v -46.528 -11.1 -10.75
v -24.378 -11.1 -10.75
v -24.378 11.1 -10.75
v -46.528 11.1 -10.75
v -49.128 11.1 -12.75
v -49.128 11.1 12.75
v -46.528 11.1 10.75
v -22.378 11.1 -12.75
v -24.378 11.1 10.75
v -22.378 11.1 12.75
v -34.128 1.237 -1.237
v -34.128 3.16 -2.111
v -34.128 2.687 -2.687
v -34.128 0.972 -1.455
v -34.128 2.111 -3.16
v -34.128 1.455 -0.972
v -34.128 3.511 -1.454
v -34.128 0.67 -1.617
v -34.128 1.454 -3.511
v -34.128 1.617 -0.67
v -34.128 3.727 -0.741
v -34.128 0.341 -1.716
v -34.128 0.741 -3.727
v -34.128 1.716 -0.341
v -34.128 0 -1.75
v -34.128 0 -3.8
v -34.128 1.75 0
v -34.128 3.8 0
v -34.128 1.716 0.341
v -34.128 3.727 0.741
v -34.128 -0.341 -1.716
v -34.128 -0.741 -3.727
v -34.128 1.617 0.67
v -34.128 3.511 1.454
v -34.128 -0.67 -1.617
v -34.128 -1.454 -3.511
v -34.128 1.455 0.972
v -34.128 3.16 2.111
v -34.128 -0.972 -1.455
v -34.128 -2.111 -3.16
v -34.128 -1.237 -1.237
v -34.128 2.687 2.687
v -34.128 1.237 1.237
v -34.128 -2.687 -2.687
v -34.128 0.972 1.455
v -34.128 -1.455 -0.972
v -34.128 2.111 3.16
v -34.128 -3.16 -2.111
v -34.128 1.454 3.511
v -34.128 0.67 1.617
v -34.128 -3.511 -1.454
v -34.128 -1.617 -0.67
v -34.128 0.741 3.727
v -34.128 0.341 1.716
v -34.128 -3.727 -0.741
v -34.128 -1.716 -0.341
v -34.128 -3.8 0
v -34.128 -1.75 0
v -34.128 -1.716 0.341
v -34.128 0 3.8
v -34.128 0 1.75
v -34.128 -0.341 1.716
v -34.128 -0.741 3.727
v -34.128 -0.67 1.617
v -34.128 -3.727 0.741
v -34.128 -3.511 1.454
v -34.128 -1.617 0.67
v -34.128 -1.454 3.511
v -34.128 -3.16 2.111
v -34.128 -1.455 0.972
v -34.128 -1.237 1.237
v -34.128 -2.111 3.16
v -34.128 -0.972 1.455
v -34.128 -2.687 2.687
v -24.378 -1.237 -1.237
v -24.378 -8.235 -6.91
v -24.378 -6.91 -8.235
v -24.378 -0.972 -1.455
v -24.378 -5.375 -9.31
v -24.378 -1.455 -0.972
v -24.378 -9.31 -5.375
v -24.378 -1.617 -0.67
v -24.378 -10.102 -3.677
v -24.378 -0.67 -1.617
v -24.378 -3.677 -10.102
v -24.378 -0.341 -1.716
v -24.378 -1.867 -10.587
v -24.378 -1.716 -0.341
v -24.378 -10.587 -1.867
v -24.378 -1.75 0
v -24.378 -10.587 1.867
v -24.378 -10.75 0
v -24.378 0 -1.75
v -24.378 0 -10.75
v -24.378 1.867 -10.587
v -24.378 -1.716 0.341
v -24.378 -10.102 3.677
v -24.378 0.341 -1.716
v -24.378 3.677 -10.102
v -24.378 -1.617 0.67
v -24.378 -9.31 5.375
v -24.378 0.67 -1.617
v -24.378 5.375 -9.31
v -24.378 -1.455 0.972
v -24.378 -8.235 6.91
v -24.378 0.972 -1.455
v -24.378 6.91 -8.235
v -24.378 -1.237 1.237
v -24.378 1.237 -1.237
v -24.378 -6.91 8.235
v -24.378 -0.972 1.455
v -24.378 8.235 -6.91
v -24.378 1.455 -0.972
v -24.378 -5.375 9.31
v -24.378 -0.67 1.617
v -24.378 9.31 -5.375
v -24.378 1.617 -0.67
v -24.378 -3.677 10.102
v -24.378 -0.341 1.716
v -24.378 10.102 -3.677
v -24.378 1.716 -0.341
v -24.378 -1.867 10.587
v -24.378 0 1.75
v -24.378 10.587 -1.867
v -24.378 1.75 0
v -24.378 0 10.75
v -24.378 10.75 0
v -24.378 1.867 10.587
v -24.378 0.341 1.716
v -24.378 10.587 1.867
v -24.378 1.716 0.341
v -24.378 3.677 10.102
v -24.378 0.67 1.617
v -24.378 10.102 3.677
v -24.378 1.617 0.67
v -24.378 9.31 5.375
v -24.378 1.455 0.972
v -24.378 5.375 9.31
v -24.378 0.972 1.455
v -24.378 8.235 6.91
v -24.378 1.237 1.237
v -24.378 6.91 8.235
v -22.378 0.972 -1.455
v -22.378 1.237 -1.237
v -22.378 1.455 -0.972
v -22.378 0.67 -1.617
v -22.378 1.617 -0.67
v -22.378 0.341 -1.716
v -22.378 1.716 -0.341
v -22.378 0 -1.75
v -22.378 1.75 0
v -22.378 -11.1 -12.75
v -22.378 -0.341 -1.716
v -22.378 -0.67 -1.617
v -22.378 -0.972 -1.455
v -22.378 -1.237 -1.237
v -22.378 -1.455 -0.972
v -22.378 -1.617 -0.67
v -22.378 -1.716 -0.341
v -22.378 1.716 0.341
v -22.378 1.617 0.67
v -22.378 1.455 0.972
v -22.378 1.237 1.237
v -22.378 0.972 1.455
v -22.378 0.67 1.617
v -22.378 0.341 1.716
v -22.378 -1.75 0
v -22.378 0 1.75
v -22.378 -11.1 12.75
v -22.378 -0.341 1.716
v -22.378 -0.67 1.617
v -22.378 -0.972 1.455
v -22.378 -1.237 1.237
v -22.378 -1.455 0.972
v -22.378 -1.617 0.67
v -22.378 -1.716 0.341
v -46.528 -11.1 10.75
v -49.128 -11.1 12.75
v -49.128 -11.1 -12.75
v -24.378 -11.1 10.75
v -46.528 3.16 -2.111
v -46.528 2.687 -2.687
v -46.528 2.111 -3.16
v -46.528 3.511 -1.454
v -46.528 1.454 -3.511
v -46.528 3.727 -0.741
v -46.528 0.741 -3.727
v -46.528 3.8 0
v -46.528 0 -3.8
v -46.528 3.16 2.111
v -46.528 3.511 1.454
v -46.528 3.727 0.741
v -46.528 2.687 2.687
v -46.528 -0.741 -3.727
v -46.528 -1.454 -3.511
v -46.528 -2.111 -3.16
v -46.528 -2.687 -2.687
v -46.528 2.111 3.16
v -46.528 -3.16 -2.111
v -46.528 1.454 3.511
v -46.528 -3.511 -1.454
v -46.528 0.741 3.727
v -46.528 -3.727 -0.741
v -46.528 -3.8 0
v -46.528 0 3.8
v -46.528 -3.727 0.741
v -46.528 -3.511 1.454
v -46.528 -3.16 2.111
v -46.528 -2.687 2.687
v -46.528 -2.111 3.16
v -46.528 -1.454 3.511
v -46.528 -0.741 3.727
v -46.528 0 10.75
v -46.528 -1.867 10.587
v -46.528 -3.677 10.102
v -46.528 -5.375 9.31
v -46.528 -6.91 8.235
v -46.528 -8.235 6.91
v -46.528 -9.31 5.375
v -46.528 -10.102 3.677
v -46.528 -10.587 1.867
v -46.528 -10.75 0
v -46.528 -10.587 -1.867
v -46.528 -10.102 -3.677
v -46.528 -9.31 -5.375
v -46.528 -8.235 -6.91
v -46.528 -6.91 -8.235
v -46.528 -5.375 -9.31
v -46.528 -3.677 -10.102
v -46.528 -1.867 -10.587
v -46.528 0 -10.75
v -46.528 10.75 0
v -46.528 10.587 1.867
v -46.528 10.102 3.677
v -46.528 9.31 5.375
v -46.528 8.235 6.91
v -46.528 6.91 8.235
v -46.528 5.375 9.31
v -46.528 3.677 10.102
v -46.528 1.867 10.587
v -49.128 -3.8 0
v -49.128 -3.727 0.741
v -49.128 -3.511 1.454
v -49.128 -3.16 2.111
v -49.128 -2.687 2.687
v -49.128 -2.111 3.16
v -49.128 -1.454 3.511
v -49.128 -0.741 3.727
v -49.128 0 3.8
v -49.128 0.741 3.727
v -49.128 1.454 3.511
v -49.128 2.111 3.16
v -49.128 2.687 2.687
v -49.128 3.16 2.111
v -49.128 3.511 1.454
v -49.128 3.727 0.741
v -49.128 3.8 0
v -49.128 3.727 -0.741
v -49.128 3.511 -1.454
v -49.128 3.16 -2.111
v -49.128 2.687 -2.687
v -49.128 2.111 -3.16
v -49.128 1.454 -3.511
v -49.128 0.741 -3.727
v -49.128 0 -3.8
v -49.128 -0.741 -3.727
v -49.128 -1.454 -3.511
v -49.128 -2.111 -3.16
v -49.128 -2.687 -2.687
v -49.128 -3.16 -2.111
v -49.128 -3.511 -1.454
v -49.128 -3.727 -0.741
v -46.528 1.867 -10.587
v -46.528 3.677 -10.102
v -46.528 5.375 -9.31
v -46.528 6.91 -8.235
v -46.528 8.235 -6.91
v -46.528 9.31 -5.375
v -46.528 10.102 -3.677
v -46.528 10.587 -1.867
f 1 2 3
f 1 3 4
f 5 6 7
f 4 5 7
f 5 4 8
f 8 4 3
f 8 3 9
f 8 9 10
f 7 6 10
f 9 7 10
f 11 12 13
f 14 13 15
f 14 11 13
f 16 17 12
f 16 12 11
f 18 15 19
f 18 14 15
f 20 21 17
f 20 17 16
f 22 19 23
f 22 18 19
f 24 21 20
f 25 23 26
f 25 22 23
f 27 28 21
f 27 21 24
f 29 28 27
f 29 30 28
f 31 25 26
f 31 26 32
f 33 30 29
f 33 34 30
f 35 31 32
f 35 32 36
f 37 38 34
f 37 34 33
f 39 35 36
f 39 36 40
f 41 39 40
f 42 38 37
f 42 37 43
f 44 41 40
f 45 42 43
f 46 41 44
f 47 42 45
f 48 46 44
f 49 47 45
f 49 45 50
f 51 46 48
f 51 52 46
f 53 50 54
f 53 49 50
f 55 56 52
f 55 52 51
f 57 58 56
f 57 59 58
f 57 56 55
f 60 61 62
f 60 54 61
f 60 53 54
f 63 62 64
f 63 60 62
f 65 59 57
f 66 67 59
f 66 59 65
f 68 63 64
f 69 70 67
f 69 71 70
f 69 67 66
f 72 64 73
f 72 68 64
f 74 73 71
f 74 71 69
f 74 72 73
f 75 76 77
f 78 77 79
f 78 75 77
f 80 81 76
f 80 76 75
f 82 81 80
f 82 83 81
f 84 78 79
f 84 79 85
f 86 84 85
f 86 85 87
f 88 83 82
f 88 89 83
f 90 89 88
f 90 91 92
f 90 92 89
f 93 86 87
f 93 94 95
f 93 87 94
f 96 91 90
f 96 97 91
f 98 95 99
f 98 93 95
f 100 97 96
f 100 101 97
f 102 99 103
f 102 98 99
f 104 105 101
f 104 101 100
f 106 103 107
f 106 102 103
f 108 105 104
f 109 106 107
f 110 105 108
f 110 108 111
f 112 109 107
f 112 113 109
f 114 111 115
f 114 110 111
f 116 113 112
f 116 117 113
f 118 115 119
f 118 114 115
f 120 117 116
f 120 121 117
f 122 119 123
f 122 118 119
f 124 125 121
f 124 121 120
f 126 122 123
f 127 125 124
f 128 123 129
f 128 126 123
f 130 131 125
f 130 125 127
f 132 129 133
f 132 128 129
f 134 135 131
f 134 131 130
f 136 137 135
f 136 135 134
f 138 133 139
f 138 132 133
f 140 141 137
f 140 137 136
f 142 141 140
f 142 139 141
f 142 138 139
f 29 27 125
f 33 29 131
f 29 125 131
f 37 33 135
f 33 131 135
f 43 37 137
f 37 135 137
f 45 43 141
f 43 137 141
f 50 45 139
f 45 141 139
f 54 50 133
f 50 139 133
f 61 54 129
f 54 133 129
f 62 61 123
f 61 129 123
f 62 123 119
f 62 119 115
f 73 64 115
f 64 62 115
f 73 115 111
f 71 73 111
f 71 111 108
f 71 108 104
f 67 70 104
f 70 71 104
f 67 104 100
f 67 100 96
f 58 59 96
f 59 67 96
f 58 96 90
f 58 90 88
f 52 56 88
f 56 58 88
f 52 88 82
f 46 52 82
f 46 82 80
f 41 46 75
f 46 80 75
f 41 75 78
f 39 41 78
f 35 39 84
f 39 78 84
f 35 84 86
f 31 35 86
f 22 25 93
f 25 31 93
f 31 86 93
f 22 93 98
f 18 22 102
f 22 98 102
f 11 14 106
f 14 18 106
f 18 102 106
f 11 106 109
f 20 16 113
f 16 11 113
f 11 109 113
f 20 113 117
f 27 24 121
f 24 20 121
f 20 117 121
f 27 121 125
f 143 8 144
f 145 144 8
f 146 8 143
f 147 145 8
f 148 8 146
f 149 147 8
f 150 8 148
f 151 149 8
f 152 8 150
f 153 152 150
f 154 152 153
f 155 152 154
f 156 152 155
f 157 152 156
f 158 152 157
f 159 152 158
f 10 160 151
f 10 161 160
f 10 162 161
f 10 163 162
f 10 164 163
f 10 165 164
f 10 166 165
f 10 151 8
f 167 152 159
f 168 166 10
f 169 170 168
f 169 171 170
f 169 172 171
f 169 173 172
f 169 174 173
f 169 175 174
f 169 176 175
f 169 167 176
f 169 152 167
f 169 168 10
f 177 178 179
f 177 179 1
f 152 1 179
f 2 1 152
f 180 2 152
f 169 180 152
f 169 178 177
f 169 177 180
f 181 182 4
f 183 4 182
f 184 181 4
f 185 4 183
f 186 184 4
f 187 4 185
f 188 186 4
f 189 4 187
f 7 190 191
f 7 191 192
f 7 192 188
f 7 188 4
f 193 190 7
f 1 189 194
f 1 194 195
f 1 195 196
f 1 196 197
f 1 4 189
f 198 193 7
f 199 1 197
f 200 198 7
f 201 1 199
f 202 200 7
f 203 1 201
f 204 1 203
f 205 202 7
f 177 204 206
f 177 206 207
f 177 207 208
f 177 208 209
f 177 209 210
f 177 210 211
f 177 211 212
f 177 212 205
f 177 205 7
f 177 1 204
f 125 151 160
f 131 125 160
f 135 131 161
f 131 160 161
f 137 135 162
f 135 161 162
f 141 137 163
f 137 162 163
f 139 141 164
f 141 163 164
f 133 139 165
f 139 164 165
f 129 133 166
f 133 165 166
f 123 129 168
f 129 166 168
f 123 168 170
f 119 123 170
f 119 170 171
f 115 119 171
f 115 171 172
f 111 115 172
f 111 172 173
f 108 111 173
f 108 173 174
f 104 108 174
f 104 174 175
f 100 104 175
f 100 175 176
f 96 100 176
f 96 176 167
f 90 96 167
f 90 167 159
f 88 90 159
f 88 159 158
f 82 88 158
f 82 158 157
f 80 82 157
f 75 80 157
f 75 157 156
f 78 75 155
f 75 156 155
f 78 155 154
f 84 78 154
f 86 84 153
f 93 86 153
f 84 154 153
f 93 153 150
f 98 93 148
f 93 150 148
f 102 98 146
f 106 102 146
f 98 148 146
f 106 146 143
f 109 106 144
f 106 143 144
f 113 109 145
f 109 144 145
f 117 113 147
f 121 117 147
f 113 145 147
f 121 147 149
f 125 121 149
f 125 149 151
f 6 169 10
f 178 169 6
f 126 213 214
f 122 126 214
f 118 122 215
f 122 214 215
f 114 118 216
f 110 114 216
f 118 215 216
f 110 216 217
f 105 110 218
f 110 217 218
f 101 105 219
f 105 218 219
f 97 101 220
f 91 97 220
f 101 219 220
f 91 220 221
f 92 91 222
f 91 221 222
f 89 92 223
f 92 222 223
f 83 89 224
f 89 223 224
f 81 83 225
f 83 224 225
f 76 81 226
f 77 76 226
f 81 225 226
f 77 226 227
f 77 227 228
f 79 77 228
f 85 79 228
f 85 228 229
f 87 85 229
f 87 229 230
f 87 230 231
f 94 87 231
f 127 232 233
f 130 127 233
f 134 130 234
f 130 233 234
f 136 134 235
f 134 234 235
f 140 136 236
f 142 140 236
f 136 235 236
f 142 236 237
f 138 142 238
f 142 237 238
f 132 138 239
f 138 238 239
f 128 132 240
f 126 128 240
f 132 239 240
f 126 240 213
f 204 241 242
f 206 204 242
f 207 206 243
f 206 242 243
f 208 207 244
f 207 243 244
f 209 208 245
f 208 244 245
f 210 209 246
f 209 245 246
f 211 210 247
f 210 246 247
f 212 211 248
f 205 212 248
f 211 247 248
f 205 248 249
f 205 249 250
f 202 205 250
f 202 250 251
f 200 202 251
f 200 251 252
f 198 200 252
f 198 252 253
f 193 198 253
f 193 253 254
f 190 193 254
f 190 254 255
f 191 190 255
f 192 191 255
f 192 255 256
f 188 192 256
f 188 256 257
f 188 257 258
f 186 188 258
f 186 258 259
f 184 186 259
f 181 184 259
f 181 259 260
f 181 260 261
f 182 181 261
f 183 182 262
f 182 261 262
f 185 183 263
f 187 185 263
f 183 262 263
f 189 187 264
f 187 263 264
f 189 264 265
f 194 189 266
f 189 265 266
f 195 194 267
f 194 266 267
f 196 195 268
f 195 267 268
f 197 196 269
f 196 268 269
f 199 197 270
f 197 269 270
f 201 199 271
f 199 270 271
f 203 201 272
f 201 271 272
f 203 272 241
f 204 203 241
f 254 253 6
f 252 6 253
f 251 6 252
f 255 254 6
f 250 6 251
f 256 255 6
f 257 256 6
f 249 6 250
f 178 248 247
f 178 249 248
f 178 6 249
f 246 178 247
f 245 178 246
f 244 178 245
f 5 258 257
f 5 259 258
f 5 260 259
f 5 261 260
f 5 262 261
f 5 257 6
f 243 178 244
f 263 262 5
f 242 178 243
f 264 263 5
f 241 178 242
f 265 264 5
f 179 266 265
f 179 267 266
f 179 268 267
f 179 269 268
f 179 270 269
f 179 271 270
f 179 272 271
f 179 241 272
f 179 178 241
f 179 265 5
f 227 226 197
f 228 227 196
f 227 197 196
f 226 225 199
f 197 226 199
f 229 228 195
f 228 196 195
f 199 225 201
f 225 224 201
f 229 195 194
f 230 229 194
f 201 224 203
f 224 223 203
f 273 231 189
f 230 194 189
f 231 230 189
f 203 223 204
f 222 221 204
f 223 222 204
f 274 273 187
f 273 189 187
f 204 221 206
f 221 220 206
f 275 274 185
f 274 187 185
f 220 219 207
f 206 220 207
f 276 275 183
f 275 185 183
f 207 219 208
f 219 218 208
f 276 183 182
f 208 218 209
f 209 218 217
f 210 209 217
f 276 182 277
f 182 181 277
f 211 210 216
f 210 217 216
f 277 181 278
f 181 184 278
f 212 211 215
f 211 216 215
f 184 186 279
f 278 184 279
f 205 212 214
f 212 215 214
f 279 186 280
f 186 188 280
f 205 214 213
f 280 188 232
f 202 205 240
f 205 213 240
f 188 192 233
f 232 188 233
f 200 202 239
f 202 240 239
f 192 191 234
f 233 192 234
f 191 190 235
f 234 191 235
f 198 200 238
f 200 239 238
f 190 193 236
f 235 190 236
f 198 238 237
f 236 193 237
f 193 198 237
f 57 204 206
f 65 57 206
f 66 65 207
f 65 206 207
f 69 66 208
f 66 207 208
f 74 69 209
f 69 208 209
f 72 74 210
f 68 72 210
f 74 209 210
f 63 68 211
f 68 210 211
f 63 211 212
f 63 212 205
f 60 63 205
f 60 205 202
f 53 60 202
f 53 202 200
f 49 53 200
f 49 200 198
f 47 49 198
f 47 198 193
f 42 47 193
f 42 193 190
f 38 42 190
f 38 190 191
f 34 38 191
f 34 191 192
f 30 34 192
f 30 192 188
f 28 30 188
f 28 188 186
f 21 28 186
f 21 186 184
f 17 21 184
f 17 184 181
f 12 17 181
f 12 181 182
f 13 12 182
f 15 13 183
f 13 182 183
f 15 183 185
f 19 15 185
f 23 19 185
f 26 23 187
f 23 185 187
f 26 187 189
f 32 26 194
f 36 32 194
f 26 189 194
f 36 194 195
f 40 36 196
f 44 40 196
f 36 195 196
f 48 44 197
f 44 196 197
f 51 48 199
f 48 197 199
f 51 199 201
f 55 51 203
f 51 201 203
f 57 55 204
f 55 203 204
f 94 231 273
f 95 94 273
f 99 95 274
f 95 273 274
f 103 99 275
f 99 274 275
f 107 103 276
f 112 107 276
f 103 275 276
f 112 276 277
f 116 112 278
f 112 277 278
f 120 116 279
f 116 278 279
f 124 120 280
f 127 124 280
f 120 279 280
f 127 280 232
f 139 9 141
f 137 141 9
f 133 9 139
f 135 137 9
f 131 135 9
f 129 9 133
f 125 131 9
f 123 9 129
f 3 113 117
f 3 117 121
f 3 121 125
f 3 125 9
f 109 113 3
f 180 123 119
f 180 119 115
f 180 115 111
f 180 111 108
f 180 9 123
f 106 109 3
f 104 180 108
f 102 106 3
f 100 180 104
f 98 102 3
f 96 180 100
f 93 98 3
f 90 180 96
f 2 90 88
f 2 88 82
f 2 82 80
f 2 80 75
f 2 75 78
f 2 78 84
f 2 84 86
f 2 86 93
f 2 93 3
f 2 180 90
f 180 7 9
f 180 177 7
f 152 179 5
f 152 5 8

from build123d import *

# Parameters (mm, degrees)
F1_DEPTH = 11.1
F3_DEPTH = 22.15
F4_R     = 1.75
F5_DEPTH = 26.75
F6_R     = 3.8
F6_R_2   = 1.75
F7_DEPTH = 15


with BuildPart() as f1:
    # F0 (on Front) → F1 (new body, symmetric)
    with BuildSketch(Plane.XZ):
        Polygon((-49.128158, 12.75), (-49.128158, 0), (-46.528158, 0), (-46.528158, 10.75), (-24.378158, 10.75), (-24.378158, 0), (-22.378158, 0), (-22.378158, 12.75), align=None)
        Polygon((-46.528158, 0), (-49.128158, 0), (-49.128158, -12.75), (-22.378158, -12.75), (-22.378158, 0), (-24.378158, 0), (-24.378158, -10.75), (-46.528158, -10.75), align=None)
    extrude(amount=F1_DEPTH, both=True)


with BuildPart() as f3:
    # F2 (on face) → F3 (new body, through all)
    with BuildSketch(Plane.YZ.offset(-46.528158)):
        with BuildLine():
            ThreePointArc((0, -10.75), (7.601398, -7.601398), (10.75, 0))
            ThreePointArc((10.75, 0), (7.601398, 7.601398), (0, 10.75))
            ThreePointArc((0, 10.75), (-10.75, 0), (0, -10.75))
        make_face()
    extrude(amount=F3_DEPTH)


with BuildPart() as f5_tool:
    # F4 (on face) → F5 (new body, through all)
    with BuildSketch(Plane.YZ.offset(-22.378158)):
        Circle(F4_R)
    extrude(amount=-F5_DEPTH)


with BuildPart() as f1_1:
    add(f1.part)

    # F5: cut by f5_tool
    add(f5_tool.part, mode=Mode.SUBTRACT)


with BuildPart() as f3_1:
    add(f3.part)

    # F5: cut by f5_tool
    add(f5_tool.part, mode=Mode.SUBTRACT)


with BuildPart() as f7_tool:
    # F6 (on face) → F7 (new body)
    with BuildSketch(Plane(origin=(-49.128158, 0, 0), x_dir=(0, -1, 0), z_dir=(-1, 0, 0))):
        Circle(F6_R)
        Circle(F6_R)
        Circle(F6_R_2, mode=Mode.SUBTRACT)
    extrude(amount=-F7_DEPTH)


with BuildPart() as f1_2:
    add(f1_1.part)

    # F7: cut by f7_tool
    add(f7_tool.part, mode=Mode.SUBTRACT)


with BuildPart() as f3_2:
    add(f3_1.part)

    # F7: cut by f7_tool
    add(f7_tool.part, mode=Mode.SUBTRACT)


solid = Compound([f1_2.part, f3_2.part])
